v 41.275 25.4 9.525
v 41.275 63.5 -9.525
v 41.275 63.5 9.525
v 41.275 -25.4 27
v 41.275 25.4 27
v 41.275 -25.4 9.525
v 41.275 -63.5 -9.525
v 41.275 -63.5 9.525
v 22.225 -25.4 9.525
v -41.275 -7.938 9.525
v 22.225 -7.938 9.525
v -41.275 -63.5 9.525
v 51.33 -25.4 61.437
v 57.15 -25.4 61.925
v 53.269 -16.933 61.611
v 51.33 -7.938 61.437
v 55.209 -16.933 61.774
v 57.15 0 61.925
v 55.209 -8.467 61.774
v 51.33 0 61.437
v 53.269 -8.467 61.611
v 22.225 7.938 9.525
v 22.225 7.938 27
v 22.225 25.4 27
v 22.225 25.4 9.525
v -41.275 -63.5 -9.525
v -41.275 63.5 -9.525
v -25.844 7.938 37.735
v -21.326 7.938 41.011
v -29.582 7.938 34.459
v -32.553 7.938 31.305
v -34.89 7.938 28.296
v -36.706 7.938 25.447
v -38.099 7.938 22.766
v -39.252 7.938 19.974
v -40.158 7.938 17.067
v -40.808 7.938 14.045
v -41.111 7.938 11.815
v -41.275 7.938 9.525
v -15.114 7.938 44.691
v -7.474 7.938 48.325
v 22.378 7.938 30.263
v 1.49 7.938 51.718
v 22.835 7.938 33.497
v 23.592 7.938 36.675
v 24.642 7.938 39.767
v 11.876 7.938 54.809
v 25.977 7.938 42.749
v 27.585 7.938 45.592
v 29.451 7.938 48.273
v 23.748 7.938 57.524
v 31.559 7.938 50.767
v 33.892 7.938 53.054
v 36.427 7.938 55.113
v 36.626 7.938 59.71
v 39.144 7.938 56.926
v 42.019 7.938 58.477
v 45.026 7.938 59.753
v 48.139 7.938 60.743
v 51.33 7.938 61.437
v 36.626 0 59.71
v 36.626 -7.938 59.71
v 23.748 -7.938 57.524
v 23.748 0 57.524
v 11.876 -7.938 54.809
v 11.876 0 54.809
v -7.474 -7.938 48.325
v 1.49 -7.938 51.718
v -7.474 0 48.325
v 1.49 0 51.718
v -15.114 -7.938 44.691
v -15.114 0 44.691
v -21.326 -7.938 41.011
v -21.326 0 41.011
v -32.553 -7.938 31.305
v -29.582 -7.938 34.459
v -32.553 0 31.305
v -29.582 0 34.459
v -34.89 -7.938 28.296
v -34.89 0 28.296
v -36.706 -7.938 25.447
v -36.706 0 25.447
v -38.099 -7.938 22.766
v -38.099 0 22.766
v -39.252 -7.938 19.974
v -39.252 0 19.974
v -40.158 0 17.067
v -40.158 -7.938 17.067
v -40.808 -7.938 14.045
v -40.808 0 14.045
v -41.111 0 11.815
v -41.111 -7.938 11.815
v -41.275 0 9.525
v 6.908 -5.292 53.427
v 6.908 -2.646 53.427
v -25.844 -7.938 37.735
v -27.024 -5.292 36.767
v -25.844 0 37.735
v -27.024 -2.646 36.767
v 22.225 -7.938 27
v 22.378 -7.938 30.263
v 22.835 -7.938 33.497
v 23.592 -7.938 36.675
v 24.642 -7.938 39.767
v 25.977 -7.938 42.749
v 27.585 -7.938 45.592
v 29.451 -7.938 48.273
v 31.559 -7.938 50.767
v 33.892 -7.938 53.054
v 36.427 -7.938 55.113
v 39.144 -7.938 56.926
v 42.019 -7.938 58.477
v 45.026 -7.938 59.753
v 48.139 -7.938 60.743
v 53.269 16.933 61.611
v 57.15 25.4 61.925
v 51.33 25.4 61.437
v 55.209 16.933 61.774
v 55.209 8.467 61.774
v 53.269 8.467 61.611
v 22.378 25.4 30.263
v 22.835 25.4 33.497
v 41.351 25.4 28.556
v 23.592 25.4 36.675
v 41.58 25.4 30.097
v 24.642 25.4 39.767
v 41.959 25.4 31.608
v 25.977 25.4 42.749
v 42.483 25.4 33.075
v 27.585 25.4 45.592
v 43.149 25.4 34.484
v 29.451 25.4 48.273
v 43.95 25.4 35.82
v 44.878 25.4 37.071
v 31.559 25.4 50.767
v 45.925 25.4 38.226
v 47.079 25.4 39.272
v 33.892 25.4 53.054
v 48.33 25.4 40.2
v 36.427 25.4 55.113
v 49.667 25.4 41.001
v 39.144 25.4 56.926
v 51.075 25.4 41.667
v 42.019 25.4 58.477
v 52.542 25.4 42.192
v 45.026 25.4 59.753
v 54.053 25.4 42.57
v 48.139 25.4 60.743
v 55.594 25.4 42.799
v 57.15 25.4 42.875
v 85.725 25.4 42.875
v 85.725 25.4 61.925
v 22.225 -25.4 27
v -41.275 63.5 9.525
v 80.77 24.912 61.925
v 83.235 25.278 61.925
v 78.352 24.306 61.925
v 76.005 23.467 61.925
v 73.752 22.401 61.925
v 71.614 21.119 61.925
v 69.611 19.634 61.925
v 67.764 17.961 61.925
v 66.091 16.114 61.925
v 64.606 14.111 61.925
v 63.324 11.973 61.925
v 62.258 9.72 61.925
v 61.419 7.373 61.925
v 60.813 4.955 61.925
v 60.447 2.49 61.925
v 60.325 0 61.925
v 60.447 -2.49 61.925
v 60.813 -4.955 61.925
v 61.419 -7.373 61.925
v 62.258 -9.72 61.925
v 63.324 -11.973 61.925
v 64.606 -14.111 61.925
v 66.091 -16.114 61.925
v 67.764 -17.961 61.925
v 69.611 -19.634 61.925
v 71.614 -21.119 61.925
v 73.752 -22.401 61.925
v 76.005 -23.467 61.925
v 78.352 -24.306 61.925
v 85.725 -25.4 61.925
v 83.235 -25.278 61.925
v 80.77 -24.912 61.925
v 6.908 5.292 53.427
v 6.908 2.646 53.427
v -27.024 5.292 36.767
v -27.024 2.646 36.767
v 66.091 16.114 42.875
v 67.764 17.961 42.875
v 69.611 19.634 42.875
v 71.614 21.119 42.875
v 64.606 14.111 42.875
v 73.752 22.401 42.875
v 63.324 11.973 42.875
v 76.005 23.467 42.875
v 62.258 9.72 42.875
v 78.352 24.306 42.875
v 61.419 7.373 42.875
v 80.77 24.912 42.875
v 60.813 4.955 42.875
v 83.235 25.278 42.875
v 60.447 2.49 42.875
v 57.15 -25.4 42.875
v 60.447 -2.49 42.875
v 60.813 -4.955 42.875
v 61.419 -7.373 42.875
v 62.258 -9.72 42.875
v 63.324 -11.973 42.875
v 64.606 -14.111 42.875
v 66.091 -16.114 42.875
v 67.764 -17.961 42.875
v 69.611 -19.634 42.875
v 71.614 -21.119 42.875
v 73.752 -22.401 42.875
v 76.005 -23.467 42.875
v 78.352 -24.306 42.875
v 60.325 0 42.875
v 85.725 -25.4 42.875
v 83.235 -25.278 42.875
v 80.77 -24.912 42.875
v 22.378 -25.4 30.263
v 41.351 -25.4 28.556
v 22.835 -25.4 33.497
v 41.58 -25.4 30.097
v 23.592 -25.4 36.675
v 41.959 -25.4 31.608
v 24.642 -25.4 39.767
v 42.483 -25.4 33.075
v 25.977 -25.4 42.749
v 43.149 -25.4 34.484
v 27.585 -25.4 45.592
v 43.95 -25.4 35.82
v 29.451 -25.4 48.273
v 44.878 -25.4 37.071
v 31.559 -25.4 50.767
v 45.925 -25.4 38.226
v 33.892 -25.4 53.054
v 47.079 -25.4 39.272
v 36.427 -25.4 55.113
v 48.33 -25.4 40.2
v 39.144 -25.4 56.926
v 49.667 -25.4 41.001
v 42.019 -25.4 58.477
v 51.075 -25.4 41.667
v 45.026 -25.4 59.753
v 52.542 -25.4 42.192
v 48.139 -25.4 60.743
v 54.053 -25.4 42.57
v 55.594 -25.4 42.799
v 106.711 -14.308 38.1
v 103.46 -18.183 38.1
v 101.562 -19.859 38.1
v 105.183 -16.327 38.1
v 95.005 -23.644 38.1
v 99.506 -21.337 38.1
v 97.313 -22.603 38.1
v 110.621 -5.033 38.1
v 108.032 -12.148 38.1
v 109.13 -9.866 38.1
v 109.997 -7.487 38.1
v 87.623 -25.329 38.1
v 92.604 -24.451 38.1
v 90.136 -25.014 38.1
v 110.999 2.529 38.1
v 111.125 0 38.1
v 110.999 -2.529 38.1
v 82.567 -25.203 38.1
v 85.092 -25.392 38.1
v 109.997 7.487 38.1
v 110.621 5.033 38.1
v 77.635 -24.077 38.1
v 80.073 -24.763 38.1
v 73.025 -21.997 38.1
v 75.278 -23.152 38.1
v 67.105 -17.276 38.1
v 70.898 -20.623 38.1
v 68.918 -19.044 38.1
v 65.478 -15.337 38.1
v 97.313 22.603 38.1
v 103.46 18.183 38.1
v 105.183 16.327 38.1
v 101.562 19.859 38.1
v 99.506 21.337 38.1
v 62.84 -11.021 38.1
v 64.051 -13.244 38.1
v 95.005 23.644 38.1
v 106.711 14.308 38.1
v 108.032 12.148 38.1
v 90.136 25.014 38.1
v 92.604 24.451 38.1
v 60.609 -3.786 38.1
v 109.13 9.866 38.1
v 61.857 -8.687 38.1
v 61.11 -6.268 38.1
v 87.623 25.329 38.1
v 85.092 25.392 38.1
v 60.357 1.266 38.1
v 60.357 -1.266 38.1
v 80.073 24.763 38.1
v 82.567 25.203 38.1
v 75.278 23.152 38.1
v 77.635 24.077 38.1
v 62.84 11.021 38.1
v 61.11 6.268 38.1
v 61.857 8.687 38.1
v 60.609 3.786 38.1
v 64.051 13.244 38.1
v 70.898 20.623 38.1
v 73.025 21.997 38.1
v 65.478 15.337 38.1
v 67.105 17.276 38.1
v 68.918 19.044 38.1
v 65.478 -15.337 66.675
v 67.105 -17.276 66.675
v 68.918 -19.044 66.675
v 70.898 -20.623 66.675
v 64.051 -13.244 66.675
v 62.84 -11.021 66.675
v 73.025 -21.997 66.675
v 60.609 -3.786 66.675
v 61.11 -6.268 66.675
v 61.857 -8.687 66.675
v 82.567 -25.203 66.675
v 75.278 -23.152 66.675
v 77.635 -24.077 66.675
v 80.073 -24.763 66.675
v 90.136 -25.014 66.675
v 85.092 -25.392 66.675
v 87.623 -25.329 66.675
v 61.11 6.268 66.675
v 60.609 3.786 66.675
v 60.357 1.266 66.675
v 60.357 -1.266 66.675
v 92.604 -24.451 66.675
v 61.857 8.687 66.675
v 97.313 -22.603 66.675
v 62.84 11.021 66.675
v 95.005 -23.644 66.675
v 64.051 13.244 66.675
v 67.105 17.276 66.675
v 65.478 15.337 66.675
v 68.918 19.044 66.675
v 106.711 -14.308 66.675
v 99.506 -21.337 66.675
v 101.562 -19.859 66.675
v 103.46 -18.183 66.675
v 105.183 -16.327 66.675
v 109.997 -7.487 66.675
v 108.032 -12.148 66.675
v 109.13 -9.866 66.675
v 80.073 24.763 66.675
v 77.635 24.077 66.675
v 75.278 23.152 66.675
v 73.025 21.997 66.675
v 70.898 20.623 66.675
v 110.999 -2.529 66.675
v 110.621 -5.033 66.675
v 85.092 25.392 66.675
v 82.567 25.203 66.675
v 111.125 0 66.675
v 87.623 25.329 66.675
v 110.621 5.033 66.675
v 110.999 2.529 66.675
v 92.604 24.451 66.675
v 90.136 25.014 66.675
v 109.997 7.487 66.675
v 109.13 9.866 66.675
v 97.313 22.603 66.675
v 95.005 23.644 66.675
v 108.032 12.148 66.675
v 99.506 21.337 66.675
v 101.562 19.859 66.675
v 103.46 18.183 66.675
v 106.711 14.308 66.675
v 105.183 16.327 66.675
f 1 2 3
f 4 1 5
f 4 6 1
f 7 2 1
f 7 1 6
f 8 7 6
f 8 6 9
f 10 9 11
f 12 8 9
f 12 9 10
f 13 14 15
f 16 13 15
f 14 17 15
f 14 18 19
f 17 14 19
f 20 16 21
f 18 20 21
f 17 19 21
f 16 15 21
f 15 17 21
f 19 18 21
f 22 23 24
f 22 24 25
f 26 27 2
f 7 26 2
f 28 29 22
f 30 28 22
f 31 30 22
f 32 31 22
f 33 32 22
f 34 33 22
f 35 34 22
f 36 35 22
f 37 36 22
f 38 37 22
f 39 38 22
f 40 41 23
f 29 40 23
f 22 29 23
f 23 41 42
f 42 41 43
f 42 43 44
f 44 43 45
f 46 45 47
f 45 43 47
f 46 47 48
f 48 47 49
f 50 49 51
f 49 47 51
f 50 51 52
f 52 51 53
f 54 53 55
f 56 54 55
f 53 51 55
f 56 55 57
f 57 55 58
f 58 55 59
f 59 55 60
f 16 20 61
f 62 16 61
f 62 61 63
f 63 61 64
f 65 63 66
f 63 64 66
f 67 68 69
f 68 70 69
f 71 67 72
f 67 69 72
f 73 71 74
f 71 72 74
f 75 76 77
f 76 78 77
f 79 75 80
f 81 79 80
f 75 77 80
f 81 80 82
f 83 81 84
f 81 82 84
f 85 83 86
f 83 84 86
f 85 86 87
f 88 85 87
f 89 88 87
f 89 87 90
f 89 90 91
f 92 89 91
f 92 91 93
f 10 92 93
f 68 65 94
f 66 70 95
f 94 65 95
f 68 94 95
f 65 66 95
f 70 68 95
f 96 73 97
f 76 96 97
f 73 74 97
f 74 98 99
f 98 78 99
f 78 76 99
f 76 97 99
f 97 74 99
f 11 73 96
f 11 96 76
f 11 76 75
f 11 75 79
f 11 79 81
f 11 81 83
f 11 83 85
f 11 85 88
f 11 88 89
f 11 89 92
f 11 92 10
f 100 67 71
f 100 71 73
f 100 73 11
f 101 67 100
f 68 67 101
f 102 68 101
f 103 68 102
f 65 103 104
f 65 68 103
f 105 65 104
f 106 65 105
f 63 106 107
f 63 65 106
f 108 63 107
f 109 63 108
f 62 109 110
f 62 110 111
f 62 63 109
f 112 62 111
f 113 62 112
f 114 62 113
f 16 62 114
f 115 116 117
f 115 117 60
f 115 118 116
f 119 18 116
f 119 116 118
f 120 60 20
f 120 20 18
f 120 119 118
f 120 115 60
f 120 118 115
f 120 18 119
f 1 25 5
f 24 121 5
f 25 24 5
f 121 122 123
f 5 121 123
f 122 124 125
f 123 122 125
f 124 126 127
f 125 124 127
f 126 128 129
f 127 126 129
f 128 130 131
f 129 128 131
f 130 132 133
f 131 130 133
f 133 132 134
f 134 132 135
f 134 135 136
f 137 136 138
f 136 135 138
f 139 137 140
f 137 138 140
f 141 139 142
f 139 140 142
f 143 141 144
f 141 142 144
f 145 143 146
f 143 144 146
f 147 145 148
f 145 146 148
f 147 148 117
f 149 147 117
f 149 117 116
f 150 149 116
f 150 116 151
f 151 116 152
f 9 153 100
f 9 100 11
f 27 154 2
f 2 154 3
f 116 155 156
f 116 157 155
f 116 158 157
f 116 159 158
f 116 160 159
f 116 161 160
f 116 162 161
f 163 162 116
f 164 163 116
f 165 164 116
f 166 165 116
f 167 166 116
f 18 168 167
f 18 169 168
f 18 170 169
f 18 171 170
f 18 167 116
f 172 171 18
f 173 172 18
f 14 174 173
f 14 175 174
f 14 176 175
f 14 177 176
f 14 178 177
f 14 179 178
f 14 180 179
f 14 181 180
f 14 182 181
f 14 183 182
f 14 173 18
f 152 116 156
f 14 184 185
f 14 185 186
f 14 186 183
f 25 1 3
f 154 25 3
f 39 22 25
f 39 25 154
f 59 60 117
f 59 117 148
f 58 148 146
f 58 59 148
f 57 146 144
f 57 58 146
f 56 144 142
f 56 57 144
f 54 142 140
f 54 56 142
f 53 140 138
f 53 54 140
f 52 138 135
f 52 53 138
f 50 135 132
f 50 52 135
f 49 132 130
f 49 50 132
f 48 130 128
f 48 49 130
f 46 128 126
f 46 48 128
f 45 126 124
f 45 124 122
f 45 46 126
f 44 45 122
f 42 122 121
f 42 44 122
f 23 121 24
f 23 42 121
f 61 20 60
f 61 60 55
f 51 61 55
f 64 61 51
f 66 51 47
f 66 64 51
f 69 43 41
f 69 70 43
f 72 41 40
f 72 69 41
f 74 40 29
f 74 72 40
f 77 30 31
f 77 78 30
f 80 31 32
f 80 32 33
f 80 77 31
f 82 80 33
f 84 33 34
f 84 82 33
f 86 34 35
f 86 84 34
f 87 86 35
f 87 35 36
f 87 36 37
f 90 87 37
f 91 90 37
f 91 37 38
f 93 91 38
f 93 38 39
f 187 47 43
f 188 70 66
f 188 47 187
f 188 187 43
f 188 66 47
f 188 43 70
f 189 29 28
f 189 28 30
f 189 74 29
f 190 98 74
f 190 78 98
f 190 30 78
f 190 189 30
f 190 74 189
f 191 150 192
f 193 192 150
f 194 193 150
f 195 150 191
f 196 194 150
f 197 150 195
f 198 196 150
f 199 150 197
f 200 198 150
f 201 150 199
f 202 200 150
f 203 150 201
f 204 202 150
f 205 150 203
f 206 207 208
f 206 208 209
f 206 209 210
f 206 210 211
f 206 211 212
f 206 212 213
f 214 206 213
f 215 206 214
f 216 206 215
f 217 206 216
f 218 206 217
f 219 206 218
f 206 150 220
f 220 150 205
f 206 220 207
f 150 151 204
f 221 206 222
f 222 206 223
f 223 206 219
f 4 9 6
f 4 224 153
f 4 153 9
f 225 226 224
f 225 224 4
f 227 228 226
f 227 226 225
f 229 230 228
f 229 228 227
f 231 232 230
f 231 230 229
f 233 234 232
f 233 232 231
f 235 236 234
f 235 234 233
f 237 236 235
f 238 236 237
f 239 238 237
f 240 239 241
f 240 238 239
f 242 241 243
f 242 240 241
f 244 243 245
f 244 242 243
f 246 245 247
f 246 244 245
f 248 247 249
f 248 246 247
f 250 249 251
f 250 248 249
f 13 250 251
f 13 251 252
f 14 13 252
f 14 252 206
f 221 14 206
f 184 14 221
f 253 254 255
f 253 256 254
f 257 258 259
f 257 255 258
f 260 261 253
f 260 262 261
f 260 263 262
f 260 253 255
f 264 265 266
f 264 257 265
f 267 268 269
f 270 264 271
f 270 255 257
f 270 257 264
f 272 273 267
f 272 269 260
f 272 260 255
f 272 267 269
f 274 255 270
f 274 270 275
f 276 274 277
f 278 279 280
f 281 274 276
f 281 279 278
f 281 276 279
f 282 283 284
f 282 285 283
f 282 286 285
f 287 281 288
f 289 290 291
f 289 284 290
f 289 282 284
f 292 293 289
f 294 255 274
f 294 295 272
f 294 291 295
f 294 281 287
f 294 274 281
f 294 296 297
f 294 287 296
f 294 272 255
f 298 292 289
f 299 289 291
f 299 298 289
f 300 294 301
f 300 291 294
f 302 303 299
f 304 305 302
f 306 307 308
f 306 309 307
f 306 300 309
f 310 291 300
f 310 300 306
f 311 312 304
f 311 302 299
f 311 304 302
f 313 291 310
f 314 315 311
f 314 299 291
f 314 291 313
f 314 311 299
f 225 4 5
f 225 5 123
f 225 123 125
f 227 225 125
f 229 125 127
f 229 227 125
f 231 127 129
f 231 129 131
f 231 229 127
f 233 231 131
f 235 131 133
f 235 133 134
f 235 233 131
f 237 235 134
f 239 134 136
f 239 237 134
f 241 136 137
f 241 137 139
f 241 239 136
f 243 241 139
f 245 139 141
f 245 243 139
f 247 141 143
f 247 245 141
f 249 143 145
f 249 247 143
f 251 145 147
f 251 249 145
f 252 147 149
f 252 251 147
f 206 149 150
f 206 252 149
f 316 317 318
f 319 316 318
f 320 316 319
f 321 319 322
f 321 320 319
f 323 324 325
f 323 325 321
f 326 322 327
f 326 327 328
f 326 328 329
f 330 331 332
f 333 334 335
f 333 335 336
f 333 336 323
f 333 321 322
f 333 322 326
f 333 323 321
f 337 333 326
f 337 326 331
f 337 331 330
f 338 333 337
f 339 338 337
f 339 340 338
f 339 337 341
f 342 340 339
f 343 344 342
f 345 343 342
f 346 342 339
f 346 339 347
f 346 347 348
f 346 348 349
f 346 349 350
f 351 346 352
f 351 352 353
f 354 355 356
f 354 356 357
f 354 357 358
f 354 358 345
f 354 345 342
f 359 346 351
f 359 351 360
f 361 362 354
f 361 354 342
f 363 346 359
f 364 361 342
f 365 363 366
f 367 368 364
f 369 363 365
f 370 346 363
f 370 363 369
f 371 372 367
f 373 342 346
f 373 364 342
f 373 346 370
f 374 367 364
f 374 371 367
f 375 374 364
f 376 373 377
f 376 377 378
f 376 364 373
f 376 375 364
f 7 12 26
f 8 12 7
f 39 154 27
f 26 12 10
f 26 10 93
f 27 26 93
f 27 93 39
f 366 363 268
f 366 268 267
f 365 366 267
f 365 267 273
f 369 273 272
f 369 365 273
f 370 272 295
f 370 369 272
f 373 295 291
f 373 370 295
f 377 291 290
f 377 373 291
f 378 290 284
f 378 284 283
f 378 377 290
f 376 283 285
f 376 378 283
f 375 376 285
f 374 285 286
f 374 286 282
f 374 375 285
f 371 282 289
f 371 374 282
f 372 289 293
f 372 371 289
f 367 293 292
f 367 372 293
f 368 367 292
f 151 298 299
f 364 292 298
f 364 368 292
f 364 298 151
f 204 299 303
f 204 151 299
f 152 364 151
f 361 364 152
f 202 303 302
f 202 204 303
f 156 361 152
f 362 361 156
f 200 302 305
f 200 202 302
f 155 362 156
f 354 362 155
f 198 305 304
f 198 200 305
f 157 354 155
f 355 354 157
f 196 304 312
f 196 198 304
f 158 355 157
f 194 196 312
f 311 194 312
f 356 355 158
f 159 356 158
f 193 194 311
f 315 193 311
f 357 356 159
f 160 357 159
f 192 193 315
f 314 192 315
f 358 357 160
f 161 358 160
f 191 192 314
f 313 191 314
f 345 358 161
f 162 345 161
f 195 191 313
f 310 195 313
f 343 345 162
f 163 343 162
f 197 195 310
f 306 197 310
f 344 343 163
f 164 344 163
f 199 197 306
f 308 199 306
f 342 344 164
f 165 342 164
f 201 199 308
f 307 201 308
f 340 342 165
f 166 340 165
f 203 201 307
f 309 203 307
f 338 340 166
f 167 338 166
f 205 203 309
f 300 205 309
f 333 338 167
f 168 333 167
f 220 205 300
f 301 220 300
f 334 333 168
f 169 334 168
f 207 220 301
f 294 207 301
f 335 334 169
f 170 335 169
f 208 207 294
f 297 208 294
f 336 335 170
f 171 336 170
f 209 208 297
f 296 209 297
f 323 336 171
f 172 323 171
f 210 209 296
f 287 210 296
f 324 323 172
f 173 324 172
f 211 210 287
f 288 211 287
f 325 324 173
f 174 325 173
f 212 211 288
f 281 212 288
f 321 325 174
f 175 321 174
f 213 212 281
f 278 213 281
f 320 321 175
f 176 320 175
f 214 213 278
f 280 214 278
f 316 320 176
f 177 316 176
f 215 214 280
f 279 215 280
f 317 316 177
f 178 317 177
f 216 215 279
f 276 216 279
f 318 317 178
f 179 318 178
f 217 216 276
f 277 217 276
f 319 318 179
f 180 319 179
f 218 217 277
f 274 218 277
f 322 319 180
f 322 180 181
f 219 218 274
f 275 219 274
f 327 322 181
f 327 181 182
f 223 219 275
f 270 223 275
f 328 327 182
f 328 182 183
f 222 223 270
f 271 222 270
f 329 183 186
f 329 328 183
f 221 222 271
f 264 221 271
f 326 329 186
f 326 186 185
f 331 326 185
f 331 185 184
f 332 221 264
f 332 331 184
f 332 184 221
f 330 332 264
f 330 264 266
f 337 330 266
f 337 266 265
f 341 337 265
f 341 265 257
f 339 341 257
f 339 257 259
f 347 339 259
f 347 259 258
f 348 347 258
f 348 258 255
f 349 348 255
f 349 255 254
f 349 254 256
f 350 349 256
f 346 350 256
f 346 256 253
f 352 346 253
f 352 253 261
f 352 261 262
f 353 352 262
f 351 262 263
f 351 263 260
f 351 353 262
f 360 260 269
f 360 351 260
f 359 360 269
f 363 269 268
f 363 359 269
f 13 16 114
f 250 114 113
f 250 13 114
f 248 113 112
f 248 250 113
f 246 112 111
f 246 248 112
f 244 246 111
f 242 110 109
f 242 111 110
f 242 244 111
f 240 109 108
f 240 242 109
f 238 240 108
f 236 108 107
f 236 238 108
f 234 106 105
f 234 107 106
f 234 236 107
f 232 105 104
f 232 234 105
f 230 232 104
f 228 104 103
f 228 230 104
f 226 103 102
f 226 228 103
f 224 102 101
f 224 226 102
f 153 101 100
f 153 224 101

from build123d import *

# Parameters (mm, degrees)
F1_DEPTH = 63.5
F0_W     = 25.4
F0_H     = 19.05
F2_DEPTH = 25.4
F3_DEPTH = 7.9375


with BuildPart() as f1:
    # F0 (on Front) → F1 (new body, symmetric)
    with BuildSketch(Plane.XZ):
        Polygon((41.275, -9.525), (41.275, 9.525), (22.225, 9.525), (-41.275, 9.525), (-41.275, -9.525), align=None)
    extrude(amount=F1_DEPTH, both=True)

    # F0 (on Front) → F2 (join, symmetric)
    with BuildSketch(Plane.XZ):
        with BuildLine():
            Line((22.225, 9.525), (41.275, 9.525))
            Line((41.275, 9.525), (41.275, 27.0002))
            ThreePointArc((41.275, 27.0002), (45.9246798487, 38.2255201513), (57.15, 42.8752))
            Line((57.15, 42.8752), (60.325, 42.8752))
            Line((60.325, 42.8752), (60.325, 61.9252))
            Line((60.325, 61.9252), (57.15, 61.9252))
            add(Edge.make_bspline(
                [(57.15, 61.9252), (55.208694365, 61.7794329693), (53.2677947949, 61.6168749598), (51.3302722534, 61.4369012641)],
                knots=[0, 0, 0, 0, 4.4505519897, 4.4505519897, 4.4505519897, 4.4505519897], degree=3))
            ThreePointArc((51.3302722534, 61.4369012641), (30.4759525329, 49.5446187489), (22.225, 27.0002))
            Line((22.225, 27.0002), (22.225, 9.525))
        make_face()
        with Locations((73.025, 52.4002)):
            Rectangle(F0_W, F0_H)
    extrude(amount=F2_DEPTH, both=True)

    # F0 (on Front) → F3 (join, symmetric)
    with BuildSketch(Plane.XZ):
        with BuildLine():
            Line((-41.275, 9.525), (22.225, 9.525))
            Line((22.225, 9.525), (22.225, 27.0002))
            ThreePointArc((22.225, 27.0002), (30.4759525329, 49.5446187489), (51.3302722534, 61.4369012641))
            add(Edge.make_bspline(
                [(51.3302722534, 61.4369012641), (4.7249280234, 57.1077975465), (-39.9264698354, 42.7019898169), (-41.275, 9.525)],
                knots=[4.4505519897, 4.4505519897, 4.4505519897, 4.4505519897, 111.5045361635, 111.5045361635, 111.5045361635, 111.5045361635], degree=3))
        make_face()
    extrude(amount=F3_DEPTH, both=True)

    # F0 (on Front) → F4 (revolve)
    with BuildSketch(Plane.XZ):
        Polygon((85.725, 61.9252), (85.725, 42.8752), (85.725, 38.1), (111.125, 38.1), (111.125, 66.675), (85.725, 66.675), align=None)
    revolve(axis=Axis((85.725, 0, 52.3875), (0, 0, 1)))


solid = f1.part
